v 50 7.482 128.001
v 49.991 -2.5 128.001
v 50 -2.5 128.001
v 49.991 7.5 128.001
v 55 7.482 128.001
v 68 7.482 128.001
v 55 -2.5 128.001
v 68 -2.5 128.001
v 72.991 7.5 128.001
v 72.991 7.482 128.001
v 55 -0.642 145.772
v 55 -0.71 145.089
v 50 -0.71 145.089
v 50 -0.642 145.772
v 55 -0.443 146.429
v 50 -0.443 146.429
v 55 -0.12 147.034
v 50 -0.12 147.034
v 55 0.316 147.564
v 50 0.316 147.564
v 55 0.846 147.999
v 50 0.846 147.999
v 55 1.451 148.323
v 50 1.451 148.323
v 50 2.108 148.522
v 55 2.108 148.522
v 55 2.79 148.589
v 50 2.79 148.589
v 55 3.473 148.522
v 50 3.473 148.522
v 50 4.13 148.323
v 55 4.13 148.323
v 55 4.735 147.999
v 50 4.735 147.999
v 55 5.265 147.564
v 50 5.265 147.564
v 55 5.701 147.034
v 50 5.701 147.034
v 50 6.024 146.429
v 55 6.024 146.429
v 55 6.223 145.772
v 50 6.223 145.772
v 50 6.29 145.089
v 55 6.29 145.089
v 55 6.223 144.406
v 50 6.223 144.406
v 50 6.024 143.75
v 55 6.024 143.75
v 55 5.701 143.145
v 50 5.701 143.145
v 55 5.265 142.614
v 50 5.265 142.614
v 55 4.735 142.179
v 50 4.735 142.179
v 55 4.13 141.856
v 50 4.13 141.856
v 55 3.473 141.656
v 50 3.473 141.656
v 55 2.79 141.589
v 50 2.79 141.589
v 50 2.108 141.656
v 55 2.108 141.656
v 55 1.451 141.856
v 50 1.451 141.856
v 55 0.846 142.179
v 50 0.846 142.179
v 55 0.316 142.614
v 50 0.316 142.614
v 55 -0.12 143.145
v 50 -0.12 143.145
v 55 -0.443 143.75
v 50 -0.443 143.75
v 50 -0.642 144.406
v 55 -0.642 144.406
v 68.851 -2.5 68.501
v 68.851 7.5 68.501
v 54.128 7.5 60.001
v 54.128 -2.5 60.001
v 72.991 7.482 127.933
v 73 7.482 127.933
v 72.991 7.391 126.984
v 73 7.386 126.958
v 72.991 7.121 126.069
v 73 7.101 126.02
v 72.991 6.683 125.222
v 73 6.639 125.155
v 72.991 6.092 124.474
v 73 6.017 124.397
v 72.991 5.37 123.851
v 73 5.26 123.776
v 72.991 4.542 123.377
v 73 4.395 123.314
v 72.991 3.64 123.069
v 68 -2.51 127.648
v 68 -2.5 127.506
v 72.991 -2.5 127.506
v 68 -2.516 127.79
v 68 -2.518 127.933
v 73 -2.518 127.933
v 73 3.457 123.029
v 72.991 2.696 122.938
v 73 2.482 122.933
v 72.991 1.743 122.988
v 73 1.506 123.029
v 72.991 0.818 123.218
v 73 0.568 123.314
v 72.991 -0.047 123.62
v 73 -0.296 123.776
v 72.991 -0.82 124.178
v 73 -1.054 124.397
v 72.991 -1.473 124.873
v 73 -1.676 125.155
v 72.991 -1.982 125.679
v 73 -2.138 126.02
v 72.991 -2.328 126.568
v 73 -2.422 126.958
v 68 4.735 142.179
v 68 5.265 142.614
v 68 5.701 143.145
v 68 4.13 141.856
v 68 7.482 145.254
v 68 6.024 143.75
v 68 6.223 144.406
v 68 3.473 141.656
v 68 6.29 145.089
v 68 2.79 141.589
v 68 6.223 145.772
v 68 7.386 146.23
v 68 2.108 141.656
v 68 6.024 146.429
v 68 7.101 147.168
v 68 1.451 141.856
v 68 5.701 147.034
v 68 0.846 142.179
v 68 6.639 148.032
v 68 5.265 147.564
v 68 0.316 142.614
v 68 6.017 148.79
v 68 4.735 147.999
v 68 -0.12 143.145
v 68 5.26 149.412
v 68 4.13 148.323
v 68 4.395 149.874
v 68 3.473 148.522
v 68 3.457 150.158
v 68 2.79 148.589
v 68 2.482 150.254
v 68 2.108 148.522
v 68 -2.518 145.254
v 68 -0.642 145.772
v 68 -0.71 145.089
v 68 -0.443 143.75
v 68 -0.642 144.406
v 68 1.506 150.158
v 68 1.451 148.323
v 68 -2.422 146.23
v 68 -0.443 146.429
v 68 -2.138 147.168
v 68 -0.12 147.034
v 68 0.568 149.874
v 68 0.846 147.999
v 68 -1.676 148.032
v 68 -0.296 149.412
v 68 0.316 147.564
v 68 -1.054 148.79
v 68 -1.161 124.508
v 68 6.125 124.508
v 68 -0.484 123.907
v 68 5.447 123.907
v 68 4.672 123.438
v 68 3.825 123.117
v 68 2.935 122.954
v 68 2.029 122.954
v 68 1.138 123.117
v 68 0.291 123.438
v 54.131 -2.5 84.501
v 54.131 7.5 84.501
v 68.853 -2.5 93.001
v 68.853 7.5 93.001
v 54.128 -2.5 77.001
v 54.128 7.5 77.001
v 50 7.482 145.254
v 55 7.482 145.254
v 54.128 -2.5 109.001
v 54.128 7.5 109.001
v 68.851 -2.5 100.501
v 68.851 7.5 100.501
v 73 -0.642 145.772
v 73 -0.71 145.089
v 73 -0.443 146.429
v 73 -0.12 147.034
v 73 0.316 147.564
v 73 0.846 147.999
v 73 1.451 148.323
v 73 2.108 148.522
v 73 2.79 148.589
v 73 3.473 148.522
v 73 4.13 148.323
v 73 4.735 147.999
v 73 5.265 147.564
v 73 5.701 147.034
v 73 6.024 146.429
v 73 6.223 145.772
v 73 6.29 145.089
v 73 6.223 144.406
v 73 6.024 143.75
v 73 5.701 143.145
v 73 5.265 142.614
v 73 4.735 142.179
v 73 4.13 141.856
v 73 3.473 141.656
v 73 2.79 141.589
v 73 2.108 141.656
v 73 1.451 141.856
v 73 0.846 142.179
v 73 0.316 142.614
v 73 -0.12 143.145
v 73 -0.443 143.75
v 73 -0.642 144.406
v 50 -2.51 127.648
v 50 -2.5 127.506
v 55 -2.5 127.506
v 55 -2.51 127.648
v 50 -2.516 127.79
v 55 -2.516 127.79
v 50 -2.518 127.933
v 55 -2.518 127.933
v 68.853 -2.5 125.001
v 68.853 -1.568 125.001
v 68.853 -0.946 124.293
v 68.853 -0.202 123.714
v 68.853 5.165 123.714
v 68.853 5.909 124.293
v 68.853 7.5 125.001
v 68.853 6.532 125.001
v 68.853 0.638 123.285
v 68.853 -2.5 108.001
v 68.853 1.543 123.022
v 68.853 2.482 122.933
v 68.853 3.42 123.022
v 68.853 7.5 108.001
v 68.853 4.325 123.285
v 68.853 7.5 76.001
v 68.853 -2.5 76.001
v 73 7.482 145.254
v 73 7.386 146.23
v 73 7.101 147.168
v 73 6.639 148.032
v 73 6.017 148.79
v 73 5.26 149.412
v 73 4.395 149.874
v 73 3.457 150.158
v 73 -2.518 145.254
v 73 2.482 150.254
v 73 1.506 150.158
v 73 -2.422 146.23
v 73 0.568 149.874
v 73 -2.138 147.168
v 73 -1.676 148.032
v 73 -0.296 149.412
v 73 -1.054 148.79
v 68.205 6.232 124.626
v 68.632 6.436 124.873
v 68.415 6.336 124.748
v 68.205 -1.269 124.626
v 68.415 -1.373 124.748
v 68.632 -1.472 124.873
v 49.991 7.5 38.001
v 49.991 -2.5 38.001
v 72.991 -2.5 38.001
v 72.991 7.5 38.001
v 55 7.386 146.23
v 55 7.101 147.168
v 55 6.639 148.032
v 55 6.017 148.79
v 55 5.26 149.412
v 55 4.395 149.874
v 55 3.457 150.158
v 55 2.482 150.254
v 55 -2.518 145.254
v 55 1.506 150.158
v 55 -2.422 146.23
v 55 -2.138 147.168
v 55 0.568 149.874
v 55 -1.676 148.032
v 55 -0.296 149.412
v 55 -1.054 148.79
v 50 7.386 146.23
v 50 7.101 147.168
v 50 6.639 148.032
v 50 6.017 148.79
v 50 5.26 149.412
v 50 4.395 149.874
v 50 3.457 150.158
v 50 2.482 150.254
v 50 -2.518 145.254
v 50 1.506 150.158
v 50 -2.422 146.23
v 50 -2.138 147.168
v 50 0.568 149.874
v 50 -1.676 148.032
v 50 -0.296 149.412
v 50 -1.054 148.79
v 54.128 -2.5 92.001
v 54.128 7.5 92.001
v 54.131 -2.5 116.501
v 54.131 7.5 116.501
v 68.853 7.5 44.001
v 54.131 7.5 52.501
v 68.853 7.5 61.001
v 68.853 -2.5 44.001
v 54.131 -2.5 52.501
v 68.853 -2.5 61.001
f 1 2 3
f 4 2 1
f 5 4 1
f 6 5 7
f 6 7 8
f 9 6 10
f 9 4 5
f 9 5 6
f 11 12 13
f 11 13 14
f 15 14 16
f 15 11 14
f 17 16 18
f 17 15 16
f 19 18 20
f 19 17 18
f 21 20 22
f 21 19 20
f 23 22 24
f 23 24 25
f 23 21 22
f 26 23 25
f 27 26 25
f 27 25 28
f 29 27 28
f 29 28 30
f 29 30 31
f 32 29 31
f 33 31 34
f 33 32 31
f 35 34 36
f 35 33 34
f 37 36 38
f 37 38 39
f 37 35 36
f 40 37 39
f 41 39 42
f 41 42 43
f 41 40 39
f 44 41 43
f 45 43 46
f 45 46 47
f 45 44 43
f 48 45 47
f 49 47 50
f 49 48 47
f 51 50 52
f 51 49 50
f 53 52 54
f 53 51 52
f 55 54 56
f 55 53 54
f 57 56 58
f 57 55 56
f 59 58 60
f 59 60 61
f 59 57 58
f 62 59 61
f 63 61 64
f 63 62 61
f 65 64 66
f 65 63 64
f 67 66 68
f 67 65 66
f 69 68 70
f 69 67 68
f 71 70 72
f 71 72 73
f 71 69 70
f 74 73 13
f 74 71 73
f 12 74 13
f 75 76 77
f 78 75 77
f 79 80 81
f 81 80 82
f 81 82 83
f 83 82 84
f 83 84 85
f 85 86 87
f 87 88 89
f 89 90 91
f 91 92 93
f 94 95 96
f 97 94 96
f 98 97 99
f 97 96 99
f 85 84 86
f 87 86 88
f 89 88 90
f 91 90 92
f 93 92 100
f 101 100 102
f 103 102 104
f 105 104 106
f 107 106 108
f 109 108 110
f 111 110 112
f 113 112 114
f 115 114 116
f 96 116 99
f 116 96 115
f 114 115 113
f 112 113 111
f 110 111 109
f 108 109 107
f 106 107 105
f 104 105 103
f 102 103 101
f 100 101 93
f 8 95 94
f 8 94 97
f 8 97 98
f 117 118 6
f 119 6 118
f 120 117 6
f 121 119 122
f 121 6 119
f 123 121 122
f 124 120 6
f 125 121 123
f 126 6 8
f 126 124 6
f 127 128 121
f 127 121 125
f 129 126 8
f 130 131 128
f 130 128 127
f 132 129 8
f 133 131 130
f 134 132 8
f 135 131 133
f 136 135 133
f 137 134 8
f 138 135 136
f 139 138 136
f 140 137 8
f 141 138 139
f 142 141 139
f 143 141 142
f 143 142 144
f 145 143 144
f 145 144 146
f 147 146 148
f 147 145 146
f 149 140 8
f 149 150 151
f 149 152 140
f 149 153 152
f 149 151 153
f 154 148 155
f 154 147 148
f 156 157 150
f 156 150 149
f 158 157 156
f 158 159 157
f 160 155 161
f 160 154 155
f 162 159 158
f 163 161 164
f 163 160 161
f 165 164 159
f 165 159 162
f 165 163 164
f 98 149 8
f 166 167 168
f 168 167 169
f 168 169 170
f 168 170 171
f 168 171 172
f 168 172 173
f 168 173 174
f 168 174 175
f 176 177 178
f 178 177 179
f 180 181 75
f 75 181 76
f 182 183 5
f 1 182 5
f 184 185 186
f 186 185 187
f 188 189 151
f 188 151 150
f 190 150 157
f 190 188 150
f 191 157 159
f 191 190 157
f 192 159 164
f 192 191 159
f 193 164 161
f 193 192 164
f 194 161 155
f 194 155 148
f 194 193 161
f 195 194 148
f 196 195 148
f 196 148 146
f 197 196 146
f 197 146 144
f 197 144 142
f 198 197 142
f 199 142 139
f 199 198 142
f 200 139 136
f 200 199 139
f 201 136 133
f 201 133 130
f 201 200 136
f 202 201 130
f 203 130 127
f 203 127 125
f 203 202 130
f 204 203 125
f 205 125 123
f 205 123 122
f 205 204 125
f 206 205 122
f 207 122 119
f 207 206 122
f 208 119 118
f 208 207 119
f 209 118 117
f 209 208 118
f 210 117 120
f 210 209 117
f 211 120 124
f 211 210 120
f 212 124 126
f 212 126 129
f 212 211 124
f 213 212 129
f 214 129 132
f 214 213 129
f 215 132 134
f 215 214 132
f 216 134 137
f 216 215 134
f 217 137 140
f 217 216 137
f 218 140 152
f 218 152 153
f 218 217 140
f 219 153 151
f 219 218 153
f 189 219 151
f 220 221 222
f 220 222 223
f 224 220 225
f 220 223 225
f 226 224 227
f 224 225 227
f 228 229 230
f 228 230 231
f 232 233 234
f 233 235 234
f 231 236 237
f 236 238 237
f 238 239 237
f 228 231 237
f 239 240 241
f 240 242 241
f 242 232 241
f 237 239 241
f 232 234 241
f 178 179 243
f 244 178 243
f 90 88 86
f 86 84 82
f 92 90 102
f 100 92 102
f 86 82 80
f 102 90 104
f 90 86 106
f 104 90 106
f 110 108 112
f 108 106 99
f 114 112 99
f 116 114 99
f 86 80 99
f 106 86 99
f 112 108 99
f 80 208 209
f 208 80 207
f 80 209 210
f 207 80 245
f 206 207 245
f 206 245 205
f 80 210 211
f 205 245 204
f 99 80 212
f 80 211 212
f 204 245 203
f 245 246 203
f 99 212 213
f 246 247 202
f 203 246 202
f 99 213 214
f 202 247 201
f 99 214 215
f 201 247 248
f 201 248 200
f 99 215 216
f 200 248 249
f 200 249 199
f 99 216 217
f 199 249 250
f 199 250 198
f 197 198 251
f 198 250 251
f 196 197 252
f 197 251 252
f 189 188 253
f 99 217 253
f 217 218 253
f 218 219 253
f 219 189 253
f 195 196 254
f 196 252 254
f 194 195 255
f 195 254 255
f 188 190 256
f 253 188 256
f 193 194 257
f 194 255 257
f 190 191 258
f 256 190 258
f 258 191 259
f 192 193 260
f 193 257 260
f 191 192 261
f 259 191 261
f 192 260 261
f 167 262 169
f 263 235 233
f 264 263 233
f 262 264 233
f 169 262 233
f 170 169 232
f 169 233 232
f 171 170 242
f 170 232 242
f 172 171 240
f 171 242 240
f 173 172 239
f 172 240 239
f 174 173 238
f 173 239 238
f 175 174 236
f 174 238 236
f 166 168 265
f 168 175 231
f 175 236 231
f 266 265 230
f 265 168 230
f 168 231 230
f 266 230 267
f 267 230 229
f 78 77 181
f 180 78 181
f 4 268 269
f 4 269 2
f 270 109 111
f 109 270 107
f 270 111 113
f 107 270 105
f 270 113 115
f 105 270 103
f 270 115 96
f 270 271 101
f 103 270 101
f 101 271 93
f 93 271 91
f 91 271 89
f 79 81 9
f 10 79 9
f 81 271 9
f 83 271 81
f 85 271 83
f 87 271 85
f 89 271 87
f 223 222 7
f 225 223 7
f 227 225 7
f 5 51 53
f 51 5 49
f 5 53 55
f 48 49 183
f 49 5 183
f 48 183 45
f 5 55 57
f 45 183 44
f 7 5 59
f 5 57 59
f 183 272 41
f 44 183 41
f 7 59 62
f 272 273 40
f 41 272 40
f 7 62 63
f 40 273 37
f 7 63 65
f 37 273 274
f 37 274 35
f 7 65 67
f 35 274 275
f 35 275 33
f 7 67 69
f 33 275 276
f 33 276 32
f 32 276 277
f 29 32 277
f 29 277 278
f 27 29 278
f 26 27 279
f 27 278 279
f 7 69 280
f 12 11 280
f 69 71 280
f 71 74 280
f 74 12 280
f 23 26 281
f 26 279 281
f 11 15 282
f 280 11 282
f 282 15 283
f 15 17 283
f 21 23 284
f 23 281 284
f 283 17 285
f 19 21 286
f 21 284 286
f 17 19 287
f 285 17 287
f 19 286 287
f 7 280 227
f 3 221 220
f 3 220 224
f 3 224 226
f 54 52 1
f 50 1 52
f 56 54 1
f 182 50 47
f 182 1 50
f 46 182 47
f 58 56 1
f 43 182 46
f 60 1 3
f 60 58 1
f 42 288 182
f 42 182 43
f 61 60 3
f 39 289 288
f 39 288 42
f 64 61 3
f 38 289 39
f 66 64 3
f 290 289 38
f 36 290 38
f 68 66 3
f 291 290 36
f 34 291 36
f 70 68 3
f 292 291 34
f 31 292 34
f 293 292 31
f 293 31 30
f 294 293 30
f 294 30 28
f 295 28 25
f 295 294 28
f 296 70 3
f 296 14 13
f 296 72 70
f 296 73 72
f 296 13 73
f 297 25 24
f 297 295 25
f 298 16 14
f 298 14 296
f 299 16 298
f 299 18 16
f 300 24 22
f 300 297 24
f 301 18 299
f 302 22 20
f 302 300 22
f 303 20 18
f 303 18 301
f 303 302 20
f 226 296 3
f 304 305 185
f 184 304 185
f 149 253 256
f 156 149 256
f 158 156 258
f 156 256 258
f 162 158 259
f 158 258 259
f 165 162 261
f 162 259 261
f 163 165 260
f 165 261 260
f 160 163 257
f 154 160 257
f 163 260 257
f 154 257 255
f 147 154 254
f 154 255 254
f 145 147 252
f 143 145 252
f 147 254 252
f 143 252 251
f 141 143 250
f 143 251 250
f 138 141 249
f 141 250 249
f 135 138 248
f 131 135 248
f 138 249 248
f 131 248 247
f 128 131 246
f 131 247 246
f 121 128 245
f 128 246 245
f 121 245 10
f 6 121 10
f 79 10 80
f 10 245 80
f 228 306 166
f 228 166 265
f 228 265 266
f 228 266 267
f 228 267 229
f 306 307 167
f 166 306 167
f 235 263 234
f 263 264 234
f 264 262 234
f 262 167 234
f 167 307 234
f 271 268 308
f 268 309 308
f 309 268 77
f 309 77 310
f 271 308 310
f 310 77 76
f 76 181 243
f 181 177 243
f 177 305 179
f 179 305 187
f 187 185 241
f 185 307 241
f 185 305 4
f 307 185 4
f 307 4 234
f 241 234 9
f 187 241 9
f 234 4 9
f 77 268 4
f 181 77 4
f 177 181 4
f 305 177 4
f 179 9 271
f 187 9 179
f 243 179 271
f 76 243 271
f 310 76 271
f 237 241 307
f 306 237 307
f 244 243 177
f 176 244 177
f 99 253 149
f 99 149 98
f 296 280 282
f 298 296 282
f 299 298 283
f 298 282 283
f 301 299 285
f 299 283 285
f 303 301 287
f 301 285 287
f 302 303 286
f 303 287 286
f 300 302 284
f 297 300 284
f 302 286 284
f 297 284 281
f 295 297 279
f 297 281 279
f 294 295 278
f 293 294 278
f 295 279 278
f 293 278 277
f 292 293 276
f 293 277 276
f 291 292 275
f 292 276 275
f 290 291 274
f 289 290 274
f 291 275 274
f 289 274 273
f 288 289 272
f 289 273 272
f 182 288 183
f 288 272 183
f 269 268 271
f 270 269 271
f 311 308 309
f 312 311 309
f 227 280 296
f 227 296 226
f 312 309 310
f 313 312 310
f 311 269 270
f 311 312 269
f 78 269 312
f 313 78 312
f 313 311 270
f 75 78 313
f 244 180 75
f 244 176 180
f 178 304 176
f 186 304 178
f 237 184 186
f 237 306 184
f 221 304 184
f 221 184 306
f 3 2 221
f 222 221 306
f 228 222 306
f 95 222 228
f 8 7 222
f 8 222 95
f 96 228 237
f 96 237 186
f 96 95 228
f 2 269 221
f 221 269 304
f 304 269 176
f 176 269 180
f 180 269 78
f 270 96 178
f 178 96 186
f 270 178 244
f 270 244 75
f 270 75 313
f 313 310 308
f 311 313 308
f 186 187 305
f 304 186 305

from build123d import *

# Parameters (mm, degrees)
SKETCH039_R      = 3.5
EXTRUDE058_DEPTH = 5
SKETCH029_W      = 23
SKETCH029_H      = 90
EXTRUDE028_DEPTH = 10


with BuildPart() as union_centro_arriba:
    # Sketch039 → Extrude058 (new body)
    with BuildSketch(Plane(origin=(0, 0, 0), x_dir=(0, -1, 0), z_dir=(-1, 0, 0))):
        with BuildLine():
            ThreePointArc((2.488294, 145.254171), (-2.511706, 150.254171), (-7.511706, 145.254171))
            Line((-7.511706, 145.254171), (-7.511706, 127.933024))
            ThreePointArc((-7.511706, 127.933024), (-2.511706, 122.933024), (2.488294, 127.933024))
            Line((2.488294, 145.254171), (2.488294, 127.933024))
        make_face()
        with Locations((-2.820375, 145.089175)):
            Circle(SKETCH039_R, mode=Mode.SUBTRACT)
    extrude(amount=EXTRUDE058_DEPTH)


with BuildPart() as union_centro_arriba_1:
    # Extrude058 placement: moved
    add(union_centro_arriba.part.moved(Location((55, -0.03, 0))))


with BuildPart() as union_centro_arriba001:
    # Link022 base: copy of union centro_arriba
    add(union_centro_arriba_1.part)


with BuildPart() as union_centro_arriba001_1:
    # Link022 placement: moved
    add(union_centro_arriba001.part.moved(Location((18, 0, 0))))


with BuildPart() as brazo_delantero:
    # Sketch029 → Extrude028 (new body)
    with BuildSketch(Plane.XZ):
        with Locations((68.040845, 88.110787)):
            Rectangle(SKETCH029_W, SKETCH029_H)
        Polygon((60.680845, 57.610787), (75.403277, 66.110787), (75.403277, 49.110787), align=None, mode=Mode.SUBTRACT)
        Polygon((60.678413, 65.110787), (60.678413, 82.110787), (75.400845, 73.610787), align=None, mode=Mode.SUBTRACT)
        Polygon((60.680845, 89.610787), (75.403277, 98.110787), (75.403277, 81.110787), align=None, mode=Mode.SUBTRACT)
        Polygon((60.678413, 97.110787), (60.678413, 114.110787), (75.400845, 105.610787), align=None, mode=Mode.SUBTRACT)
        Polygon((60.680845, 121.610787), (75.403277, 130.110787), (75.403277, 113.110787), align=None, mode=Mode.SUBTRACT)
    extrude(amount=EXTRUDE028_DEPTH)


with BuildPart() as brazo_delantero_1:
    # Extrude028 placement: moved
    add(brazo_delantero.part.moved(Location((-6.55, 7.5, -5.11))))

    # Fusion: union union centro_arriba, union centro_arriba001
    add(union_centro_arriba_1.part)
    add(union_centro_arriba001_1.part)


solid = brazo_delantero_1.part
